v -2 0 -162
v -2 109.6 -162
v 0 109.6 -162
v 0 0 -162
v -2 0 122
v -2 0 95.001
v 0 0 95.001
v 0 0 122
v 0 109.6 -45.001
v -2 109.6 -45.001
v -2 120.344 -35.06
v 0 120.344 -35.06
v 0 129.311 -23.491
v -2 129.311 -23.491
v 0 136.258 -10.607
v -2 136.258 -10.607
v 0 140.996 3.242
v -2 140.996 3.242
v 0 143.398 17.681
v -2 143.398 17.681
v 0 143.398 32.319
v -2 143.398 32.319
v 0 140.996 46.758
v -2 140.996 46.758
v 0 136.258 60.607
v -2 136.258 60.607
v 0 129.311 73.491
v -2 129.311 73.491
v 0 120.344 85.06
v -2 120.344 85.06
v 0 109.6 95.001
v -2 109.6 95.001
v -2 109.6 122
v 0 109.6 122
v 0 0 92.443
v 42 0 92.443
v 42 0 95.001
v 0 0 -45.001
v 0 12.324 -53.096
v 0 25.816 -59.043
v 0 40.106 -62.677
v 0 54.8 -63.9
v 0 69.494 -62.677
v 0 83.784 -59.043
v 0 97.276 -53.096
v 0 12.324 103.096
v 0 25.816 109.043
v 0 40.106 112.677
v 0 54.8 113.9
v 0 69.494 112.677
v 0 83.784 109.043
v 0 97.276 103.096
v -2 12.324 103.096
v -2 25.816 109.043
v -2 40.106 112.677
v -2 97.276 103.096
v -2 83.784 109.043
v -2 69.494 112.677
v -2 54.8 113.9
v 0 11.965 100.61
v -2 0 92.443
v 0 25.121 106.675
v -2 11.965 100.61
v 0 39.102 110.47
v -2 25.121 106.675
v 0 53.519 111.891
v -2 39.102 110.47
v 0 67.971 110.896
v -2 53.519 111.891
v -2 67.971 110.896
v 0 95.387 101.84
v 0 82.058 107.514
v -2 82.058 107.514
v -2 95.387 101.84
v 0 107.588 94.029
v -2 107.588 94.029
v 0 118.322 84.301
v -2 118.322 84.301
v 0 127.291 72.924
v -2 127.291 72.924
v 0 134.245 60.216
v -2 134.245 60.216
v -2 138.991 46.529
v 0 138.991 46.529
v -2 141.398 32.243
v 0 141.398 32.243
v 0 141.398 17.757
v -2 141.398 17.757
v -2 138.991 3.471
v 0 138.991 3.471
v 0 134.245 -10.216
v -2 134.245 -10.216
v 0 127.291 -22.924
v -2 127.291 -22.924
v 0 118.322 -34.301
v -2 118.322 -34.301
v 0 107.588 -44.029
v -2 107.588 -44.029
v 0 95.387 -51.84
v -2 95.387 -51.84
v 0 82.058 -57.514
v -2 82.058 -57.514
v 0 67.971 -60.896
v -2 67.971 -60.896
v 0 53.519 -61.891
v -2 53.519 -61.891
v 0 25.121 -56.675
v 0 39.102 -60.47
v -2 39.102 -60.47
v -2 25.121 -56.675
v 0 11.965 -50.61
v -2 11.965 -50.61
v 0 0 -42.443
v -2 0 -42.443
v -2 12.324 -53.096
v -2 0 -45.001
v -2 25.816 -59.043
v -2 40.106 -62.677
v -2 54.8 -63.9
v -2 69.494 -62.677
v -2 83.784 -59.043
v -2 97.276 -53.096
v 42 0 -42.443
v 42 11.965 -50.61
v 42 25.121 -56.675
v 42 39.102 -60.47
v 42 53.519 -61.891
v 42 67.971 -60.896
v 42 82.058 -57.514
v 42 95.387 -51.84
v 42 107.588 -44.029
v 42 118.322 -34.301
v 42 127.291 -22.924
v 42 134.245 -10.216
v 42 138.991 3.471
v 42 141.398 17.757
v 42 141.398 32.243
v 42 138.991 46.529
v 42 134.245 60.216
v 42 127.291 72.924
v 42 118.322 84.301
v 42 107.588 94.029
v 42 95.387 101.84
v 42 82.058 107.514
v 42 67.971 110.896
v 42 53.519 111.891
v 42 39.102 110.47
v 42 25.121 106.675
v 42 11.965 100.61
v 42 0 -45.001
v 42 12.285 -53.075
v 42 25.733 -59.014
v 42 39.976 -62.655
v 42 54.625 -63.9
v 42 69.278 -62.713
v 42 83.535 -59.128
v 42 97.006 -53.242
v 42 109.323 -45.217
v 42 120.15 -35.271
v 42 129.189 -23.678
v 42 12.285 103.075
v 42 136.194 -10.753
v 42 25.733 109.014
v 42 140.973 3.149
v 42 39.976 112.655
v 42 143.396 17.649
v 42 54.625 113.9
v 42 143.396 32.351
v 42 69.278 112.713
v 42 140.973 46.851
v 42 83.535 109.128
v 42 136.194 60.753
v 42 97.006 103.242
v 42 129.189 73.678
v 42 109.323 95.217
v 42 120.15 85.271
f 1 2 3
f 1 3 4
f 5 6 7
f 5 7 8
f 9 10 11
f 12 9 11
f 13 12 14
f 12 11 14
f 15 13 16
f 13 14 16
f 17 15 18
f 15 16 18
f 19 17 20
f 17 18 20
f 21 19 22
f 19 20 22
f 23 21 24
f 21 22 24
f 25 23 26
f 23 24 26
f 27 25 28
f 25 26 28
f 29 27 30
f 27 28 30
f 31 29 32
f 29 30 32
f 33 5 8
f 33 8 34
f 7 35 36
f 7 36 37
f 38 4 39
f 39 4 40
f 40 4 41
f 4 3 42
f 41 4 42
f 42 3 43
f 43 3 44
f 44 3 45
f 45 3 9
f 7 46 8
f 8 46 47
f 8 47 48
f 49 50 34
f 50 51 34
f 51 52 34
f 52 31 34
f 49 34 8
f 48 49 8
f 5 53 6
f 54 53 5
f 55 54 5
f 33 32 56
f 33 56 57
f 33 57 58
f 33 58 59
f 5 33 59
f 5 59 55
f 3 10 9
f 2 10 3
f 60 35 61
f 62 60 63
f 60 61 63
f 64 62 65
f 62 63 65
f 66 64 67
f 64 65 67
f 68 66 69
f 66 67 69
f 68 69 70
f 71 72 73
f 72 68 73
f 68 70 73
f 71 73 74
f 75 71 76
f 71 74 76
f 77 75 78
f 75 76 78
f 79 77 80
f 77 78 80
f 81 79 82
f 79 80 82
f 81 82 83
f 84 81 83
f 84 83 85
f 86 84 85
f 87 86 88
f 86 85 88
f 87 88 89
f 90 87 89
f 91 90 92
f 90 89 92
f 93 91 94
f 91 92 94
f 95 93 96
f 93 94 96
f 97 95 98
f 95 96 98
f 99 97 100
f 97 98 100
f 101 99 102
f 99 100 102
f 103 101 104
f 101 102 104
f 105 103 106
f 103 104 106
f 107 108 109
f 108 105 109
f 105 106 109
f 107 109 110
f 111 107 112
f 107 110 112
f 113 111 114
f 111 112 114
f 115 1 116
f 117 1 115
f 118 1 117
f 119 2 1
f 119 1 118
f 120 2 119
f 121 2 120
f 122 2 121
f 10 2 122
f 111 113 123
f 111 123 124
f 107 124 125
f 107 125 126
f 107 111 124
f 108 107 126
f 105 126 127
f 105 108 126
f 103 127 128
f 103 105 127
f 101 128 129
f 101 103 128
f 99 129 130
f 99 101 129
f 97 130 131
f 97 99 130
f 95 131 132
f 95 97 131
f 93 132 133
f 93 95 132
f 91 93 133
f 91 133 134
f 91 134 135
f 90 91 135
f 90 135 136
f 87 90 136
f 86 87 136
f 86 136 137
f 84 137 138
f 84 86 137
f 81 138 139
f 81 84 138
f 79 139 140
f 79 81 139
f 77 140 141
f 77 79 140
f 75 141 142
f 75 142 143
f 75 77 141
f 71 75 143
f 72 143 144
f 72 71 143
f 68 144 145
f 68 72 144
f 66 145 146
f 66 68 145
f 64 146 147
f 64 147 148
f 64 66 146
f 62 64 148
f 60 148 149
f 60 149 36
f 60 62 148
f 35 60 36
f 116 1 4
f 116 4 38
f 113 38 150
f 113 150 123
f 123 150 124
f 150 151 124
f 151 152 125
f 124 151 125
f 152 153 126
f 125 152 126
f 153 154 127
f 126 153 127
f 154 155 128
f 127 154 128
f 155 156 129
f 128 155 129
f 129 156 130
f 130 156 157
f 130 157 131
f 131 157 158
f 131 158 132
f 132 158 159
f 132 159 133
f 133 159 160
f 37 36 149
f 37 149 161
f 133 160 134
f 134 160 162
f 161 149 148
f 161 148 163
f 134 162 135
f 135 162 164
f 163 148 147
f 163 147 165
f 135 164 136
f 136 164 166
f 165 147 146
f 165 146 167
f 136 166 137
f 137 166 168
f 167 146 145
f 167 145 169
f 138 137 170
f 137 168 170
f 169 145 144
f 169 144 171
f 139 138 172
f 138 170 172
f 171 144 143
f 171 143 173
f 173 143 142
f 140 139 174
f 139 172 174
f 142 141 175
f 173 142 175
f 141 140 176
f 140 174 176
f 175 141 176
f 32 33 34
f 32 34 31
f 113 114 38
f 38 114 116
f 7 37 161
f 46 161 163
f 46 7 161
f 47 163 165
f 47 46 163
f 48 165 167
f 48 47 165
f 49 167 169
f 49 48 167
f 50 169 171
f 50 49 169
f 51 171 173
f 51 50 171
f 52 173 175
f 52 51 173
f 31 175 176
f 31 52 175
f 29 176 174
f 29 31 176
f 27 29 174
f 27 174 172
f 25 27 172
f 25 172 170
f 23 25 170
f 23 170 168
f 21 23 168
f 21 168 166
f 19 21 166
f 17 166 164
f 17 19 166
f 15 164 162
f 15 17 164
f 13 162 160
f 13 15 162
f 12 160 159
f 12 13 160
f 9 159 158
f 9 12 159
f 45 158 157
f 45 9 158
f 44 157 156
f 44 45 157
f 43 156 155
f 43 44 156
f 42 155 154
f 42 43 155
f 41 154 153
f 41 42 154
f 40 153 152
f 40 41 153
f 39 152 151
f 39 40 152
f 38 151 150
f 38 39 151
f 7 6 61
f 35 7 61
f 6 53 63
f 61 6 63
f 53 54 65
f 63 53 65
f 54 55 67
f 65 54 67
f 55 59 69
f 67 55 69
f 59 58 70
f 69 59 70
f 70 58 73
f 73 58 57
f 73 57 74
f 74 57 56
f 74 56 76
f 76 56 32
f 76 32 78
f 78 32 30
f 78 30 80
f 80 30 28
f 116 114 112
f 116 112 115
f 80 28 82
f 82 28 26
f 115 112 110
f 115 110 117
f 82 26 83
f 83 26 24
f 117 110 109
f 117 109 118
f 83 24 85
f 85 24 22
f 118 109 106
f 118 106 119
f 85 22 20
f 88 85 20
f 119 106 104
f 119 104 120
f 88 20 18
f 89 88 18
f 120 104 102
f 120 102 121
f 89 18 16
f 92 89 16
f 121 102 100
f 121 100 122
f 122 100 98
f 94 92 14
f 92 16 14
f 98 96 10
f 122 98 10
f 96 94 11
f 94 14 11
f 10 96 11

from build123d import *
from build123d.topology import SkipClean

# Parameters (mm, degrees)
BOSS_EXTRUDE1_DEPTH = 42.000000074
BOSS_EXTRUDE2_START = 2.000000064
BOSS_EXTRUDE2_DEPTH = 2.000000064


with BuildPart() as part:
    # Sketch1 → Boss-Extrude1 (new body)
    with BuildSketch(Plane.ZY):
        with BuildLine():
            Line((-45.001214275, 0), (-42.443087035, 0))
            ThreePointArc((-42.443087035, 0), (25, 141.699999936), (92.443087035, 0))
            Line((92.443087035, 0), (95.001214275, 0))
            ThreePointArc((95.001214275, 0), (25, 143.7), (-45.001214275, 0))
        make_face()
    extrude(amount=-BOSS_EXTRUDE1_DEPTH)

    # Sketch2 → Boss-Extrude2 (add)
    with SkipClean():  # the faces are left unmerged after this step: merging them gives an invalid solid
        with BuildSketch(Plane.ZY.offset(BOSS_EXTRUDE2_START)):
            with BuildLine():
                Line((-160, 0), (-45.001214275, 0))
                ThreePointArc((-45.001214275, 0), (-63.9, 54.8), (-45.001214275, 109.6))
                Line((-45.001214275, 109.6), (-160, 109.6))
                Line((-160, 109.6), (-162.000000064, 109.6))
                Line((-162.000000064, 109.6), (-162.000000064, 0))
                Line((-162.000000064, 0), (-160, 0))
            make_face()
            with BuildLine():
                ThreePointArc((-45.001214275, 0), (25, 143.7), (95.001214275, 0))
                Line((95.001214275, 0), (92.443087035, 0))
                ThreePointArc((92.443087035, 0), (25, 141.699999936), (-42.443087035, 0))
                Line((-42.443087035, 0), (-45.001214275, 0))
            make_face()
            with BuildLine():
                ThreePointArc((95.001214275, 109.6), (113.9, 54.8), (95.001214275, 0))
                Line((95.001214275, 0), (120, 0))
                Line((120, 0), (122.000000064, 0))
                Line((122.000000064, 0), (122.000000064, 109.6))
                Line((122.000000064, 109.6), (120, 109.6))
                Line((120, 109.6), (95.001214275, 109.6))
            make_face()
        extrude(amount=-BOSS_EXTRUDE2_DEPTH)


solid = part.part
